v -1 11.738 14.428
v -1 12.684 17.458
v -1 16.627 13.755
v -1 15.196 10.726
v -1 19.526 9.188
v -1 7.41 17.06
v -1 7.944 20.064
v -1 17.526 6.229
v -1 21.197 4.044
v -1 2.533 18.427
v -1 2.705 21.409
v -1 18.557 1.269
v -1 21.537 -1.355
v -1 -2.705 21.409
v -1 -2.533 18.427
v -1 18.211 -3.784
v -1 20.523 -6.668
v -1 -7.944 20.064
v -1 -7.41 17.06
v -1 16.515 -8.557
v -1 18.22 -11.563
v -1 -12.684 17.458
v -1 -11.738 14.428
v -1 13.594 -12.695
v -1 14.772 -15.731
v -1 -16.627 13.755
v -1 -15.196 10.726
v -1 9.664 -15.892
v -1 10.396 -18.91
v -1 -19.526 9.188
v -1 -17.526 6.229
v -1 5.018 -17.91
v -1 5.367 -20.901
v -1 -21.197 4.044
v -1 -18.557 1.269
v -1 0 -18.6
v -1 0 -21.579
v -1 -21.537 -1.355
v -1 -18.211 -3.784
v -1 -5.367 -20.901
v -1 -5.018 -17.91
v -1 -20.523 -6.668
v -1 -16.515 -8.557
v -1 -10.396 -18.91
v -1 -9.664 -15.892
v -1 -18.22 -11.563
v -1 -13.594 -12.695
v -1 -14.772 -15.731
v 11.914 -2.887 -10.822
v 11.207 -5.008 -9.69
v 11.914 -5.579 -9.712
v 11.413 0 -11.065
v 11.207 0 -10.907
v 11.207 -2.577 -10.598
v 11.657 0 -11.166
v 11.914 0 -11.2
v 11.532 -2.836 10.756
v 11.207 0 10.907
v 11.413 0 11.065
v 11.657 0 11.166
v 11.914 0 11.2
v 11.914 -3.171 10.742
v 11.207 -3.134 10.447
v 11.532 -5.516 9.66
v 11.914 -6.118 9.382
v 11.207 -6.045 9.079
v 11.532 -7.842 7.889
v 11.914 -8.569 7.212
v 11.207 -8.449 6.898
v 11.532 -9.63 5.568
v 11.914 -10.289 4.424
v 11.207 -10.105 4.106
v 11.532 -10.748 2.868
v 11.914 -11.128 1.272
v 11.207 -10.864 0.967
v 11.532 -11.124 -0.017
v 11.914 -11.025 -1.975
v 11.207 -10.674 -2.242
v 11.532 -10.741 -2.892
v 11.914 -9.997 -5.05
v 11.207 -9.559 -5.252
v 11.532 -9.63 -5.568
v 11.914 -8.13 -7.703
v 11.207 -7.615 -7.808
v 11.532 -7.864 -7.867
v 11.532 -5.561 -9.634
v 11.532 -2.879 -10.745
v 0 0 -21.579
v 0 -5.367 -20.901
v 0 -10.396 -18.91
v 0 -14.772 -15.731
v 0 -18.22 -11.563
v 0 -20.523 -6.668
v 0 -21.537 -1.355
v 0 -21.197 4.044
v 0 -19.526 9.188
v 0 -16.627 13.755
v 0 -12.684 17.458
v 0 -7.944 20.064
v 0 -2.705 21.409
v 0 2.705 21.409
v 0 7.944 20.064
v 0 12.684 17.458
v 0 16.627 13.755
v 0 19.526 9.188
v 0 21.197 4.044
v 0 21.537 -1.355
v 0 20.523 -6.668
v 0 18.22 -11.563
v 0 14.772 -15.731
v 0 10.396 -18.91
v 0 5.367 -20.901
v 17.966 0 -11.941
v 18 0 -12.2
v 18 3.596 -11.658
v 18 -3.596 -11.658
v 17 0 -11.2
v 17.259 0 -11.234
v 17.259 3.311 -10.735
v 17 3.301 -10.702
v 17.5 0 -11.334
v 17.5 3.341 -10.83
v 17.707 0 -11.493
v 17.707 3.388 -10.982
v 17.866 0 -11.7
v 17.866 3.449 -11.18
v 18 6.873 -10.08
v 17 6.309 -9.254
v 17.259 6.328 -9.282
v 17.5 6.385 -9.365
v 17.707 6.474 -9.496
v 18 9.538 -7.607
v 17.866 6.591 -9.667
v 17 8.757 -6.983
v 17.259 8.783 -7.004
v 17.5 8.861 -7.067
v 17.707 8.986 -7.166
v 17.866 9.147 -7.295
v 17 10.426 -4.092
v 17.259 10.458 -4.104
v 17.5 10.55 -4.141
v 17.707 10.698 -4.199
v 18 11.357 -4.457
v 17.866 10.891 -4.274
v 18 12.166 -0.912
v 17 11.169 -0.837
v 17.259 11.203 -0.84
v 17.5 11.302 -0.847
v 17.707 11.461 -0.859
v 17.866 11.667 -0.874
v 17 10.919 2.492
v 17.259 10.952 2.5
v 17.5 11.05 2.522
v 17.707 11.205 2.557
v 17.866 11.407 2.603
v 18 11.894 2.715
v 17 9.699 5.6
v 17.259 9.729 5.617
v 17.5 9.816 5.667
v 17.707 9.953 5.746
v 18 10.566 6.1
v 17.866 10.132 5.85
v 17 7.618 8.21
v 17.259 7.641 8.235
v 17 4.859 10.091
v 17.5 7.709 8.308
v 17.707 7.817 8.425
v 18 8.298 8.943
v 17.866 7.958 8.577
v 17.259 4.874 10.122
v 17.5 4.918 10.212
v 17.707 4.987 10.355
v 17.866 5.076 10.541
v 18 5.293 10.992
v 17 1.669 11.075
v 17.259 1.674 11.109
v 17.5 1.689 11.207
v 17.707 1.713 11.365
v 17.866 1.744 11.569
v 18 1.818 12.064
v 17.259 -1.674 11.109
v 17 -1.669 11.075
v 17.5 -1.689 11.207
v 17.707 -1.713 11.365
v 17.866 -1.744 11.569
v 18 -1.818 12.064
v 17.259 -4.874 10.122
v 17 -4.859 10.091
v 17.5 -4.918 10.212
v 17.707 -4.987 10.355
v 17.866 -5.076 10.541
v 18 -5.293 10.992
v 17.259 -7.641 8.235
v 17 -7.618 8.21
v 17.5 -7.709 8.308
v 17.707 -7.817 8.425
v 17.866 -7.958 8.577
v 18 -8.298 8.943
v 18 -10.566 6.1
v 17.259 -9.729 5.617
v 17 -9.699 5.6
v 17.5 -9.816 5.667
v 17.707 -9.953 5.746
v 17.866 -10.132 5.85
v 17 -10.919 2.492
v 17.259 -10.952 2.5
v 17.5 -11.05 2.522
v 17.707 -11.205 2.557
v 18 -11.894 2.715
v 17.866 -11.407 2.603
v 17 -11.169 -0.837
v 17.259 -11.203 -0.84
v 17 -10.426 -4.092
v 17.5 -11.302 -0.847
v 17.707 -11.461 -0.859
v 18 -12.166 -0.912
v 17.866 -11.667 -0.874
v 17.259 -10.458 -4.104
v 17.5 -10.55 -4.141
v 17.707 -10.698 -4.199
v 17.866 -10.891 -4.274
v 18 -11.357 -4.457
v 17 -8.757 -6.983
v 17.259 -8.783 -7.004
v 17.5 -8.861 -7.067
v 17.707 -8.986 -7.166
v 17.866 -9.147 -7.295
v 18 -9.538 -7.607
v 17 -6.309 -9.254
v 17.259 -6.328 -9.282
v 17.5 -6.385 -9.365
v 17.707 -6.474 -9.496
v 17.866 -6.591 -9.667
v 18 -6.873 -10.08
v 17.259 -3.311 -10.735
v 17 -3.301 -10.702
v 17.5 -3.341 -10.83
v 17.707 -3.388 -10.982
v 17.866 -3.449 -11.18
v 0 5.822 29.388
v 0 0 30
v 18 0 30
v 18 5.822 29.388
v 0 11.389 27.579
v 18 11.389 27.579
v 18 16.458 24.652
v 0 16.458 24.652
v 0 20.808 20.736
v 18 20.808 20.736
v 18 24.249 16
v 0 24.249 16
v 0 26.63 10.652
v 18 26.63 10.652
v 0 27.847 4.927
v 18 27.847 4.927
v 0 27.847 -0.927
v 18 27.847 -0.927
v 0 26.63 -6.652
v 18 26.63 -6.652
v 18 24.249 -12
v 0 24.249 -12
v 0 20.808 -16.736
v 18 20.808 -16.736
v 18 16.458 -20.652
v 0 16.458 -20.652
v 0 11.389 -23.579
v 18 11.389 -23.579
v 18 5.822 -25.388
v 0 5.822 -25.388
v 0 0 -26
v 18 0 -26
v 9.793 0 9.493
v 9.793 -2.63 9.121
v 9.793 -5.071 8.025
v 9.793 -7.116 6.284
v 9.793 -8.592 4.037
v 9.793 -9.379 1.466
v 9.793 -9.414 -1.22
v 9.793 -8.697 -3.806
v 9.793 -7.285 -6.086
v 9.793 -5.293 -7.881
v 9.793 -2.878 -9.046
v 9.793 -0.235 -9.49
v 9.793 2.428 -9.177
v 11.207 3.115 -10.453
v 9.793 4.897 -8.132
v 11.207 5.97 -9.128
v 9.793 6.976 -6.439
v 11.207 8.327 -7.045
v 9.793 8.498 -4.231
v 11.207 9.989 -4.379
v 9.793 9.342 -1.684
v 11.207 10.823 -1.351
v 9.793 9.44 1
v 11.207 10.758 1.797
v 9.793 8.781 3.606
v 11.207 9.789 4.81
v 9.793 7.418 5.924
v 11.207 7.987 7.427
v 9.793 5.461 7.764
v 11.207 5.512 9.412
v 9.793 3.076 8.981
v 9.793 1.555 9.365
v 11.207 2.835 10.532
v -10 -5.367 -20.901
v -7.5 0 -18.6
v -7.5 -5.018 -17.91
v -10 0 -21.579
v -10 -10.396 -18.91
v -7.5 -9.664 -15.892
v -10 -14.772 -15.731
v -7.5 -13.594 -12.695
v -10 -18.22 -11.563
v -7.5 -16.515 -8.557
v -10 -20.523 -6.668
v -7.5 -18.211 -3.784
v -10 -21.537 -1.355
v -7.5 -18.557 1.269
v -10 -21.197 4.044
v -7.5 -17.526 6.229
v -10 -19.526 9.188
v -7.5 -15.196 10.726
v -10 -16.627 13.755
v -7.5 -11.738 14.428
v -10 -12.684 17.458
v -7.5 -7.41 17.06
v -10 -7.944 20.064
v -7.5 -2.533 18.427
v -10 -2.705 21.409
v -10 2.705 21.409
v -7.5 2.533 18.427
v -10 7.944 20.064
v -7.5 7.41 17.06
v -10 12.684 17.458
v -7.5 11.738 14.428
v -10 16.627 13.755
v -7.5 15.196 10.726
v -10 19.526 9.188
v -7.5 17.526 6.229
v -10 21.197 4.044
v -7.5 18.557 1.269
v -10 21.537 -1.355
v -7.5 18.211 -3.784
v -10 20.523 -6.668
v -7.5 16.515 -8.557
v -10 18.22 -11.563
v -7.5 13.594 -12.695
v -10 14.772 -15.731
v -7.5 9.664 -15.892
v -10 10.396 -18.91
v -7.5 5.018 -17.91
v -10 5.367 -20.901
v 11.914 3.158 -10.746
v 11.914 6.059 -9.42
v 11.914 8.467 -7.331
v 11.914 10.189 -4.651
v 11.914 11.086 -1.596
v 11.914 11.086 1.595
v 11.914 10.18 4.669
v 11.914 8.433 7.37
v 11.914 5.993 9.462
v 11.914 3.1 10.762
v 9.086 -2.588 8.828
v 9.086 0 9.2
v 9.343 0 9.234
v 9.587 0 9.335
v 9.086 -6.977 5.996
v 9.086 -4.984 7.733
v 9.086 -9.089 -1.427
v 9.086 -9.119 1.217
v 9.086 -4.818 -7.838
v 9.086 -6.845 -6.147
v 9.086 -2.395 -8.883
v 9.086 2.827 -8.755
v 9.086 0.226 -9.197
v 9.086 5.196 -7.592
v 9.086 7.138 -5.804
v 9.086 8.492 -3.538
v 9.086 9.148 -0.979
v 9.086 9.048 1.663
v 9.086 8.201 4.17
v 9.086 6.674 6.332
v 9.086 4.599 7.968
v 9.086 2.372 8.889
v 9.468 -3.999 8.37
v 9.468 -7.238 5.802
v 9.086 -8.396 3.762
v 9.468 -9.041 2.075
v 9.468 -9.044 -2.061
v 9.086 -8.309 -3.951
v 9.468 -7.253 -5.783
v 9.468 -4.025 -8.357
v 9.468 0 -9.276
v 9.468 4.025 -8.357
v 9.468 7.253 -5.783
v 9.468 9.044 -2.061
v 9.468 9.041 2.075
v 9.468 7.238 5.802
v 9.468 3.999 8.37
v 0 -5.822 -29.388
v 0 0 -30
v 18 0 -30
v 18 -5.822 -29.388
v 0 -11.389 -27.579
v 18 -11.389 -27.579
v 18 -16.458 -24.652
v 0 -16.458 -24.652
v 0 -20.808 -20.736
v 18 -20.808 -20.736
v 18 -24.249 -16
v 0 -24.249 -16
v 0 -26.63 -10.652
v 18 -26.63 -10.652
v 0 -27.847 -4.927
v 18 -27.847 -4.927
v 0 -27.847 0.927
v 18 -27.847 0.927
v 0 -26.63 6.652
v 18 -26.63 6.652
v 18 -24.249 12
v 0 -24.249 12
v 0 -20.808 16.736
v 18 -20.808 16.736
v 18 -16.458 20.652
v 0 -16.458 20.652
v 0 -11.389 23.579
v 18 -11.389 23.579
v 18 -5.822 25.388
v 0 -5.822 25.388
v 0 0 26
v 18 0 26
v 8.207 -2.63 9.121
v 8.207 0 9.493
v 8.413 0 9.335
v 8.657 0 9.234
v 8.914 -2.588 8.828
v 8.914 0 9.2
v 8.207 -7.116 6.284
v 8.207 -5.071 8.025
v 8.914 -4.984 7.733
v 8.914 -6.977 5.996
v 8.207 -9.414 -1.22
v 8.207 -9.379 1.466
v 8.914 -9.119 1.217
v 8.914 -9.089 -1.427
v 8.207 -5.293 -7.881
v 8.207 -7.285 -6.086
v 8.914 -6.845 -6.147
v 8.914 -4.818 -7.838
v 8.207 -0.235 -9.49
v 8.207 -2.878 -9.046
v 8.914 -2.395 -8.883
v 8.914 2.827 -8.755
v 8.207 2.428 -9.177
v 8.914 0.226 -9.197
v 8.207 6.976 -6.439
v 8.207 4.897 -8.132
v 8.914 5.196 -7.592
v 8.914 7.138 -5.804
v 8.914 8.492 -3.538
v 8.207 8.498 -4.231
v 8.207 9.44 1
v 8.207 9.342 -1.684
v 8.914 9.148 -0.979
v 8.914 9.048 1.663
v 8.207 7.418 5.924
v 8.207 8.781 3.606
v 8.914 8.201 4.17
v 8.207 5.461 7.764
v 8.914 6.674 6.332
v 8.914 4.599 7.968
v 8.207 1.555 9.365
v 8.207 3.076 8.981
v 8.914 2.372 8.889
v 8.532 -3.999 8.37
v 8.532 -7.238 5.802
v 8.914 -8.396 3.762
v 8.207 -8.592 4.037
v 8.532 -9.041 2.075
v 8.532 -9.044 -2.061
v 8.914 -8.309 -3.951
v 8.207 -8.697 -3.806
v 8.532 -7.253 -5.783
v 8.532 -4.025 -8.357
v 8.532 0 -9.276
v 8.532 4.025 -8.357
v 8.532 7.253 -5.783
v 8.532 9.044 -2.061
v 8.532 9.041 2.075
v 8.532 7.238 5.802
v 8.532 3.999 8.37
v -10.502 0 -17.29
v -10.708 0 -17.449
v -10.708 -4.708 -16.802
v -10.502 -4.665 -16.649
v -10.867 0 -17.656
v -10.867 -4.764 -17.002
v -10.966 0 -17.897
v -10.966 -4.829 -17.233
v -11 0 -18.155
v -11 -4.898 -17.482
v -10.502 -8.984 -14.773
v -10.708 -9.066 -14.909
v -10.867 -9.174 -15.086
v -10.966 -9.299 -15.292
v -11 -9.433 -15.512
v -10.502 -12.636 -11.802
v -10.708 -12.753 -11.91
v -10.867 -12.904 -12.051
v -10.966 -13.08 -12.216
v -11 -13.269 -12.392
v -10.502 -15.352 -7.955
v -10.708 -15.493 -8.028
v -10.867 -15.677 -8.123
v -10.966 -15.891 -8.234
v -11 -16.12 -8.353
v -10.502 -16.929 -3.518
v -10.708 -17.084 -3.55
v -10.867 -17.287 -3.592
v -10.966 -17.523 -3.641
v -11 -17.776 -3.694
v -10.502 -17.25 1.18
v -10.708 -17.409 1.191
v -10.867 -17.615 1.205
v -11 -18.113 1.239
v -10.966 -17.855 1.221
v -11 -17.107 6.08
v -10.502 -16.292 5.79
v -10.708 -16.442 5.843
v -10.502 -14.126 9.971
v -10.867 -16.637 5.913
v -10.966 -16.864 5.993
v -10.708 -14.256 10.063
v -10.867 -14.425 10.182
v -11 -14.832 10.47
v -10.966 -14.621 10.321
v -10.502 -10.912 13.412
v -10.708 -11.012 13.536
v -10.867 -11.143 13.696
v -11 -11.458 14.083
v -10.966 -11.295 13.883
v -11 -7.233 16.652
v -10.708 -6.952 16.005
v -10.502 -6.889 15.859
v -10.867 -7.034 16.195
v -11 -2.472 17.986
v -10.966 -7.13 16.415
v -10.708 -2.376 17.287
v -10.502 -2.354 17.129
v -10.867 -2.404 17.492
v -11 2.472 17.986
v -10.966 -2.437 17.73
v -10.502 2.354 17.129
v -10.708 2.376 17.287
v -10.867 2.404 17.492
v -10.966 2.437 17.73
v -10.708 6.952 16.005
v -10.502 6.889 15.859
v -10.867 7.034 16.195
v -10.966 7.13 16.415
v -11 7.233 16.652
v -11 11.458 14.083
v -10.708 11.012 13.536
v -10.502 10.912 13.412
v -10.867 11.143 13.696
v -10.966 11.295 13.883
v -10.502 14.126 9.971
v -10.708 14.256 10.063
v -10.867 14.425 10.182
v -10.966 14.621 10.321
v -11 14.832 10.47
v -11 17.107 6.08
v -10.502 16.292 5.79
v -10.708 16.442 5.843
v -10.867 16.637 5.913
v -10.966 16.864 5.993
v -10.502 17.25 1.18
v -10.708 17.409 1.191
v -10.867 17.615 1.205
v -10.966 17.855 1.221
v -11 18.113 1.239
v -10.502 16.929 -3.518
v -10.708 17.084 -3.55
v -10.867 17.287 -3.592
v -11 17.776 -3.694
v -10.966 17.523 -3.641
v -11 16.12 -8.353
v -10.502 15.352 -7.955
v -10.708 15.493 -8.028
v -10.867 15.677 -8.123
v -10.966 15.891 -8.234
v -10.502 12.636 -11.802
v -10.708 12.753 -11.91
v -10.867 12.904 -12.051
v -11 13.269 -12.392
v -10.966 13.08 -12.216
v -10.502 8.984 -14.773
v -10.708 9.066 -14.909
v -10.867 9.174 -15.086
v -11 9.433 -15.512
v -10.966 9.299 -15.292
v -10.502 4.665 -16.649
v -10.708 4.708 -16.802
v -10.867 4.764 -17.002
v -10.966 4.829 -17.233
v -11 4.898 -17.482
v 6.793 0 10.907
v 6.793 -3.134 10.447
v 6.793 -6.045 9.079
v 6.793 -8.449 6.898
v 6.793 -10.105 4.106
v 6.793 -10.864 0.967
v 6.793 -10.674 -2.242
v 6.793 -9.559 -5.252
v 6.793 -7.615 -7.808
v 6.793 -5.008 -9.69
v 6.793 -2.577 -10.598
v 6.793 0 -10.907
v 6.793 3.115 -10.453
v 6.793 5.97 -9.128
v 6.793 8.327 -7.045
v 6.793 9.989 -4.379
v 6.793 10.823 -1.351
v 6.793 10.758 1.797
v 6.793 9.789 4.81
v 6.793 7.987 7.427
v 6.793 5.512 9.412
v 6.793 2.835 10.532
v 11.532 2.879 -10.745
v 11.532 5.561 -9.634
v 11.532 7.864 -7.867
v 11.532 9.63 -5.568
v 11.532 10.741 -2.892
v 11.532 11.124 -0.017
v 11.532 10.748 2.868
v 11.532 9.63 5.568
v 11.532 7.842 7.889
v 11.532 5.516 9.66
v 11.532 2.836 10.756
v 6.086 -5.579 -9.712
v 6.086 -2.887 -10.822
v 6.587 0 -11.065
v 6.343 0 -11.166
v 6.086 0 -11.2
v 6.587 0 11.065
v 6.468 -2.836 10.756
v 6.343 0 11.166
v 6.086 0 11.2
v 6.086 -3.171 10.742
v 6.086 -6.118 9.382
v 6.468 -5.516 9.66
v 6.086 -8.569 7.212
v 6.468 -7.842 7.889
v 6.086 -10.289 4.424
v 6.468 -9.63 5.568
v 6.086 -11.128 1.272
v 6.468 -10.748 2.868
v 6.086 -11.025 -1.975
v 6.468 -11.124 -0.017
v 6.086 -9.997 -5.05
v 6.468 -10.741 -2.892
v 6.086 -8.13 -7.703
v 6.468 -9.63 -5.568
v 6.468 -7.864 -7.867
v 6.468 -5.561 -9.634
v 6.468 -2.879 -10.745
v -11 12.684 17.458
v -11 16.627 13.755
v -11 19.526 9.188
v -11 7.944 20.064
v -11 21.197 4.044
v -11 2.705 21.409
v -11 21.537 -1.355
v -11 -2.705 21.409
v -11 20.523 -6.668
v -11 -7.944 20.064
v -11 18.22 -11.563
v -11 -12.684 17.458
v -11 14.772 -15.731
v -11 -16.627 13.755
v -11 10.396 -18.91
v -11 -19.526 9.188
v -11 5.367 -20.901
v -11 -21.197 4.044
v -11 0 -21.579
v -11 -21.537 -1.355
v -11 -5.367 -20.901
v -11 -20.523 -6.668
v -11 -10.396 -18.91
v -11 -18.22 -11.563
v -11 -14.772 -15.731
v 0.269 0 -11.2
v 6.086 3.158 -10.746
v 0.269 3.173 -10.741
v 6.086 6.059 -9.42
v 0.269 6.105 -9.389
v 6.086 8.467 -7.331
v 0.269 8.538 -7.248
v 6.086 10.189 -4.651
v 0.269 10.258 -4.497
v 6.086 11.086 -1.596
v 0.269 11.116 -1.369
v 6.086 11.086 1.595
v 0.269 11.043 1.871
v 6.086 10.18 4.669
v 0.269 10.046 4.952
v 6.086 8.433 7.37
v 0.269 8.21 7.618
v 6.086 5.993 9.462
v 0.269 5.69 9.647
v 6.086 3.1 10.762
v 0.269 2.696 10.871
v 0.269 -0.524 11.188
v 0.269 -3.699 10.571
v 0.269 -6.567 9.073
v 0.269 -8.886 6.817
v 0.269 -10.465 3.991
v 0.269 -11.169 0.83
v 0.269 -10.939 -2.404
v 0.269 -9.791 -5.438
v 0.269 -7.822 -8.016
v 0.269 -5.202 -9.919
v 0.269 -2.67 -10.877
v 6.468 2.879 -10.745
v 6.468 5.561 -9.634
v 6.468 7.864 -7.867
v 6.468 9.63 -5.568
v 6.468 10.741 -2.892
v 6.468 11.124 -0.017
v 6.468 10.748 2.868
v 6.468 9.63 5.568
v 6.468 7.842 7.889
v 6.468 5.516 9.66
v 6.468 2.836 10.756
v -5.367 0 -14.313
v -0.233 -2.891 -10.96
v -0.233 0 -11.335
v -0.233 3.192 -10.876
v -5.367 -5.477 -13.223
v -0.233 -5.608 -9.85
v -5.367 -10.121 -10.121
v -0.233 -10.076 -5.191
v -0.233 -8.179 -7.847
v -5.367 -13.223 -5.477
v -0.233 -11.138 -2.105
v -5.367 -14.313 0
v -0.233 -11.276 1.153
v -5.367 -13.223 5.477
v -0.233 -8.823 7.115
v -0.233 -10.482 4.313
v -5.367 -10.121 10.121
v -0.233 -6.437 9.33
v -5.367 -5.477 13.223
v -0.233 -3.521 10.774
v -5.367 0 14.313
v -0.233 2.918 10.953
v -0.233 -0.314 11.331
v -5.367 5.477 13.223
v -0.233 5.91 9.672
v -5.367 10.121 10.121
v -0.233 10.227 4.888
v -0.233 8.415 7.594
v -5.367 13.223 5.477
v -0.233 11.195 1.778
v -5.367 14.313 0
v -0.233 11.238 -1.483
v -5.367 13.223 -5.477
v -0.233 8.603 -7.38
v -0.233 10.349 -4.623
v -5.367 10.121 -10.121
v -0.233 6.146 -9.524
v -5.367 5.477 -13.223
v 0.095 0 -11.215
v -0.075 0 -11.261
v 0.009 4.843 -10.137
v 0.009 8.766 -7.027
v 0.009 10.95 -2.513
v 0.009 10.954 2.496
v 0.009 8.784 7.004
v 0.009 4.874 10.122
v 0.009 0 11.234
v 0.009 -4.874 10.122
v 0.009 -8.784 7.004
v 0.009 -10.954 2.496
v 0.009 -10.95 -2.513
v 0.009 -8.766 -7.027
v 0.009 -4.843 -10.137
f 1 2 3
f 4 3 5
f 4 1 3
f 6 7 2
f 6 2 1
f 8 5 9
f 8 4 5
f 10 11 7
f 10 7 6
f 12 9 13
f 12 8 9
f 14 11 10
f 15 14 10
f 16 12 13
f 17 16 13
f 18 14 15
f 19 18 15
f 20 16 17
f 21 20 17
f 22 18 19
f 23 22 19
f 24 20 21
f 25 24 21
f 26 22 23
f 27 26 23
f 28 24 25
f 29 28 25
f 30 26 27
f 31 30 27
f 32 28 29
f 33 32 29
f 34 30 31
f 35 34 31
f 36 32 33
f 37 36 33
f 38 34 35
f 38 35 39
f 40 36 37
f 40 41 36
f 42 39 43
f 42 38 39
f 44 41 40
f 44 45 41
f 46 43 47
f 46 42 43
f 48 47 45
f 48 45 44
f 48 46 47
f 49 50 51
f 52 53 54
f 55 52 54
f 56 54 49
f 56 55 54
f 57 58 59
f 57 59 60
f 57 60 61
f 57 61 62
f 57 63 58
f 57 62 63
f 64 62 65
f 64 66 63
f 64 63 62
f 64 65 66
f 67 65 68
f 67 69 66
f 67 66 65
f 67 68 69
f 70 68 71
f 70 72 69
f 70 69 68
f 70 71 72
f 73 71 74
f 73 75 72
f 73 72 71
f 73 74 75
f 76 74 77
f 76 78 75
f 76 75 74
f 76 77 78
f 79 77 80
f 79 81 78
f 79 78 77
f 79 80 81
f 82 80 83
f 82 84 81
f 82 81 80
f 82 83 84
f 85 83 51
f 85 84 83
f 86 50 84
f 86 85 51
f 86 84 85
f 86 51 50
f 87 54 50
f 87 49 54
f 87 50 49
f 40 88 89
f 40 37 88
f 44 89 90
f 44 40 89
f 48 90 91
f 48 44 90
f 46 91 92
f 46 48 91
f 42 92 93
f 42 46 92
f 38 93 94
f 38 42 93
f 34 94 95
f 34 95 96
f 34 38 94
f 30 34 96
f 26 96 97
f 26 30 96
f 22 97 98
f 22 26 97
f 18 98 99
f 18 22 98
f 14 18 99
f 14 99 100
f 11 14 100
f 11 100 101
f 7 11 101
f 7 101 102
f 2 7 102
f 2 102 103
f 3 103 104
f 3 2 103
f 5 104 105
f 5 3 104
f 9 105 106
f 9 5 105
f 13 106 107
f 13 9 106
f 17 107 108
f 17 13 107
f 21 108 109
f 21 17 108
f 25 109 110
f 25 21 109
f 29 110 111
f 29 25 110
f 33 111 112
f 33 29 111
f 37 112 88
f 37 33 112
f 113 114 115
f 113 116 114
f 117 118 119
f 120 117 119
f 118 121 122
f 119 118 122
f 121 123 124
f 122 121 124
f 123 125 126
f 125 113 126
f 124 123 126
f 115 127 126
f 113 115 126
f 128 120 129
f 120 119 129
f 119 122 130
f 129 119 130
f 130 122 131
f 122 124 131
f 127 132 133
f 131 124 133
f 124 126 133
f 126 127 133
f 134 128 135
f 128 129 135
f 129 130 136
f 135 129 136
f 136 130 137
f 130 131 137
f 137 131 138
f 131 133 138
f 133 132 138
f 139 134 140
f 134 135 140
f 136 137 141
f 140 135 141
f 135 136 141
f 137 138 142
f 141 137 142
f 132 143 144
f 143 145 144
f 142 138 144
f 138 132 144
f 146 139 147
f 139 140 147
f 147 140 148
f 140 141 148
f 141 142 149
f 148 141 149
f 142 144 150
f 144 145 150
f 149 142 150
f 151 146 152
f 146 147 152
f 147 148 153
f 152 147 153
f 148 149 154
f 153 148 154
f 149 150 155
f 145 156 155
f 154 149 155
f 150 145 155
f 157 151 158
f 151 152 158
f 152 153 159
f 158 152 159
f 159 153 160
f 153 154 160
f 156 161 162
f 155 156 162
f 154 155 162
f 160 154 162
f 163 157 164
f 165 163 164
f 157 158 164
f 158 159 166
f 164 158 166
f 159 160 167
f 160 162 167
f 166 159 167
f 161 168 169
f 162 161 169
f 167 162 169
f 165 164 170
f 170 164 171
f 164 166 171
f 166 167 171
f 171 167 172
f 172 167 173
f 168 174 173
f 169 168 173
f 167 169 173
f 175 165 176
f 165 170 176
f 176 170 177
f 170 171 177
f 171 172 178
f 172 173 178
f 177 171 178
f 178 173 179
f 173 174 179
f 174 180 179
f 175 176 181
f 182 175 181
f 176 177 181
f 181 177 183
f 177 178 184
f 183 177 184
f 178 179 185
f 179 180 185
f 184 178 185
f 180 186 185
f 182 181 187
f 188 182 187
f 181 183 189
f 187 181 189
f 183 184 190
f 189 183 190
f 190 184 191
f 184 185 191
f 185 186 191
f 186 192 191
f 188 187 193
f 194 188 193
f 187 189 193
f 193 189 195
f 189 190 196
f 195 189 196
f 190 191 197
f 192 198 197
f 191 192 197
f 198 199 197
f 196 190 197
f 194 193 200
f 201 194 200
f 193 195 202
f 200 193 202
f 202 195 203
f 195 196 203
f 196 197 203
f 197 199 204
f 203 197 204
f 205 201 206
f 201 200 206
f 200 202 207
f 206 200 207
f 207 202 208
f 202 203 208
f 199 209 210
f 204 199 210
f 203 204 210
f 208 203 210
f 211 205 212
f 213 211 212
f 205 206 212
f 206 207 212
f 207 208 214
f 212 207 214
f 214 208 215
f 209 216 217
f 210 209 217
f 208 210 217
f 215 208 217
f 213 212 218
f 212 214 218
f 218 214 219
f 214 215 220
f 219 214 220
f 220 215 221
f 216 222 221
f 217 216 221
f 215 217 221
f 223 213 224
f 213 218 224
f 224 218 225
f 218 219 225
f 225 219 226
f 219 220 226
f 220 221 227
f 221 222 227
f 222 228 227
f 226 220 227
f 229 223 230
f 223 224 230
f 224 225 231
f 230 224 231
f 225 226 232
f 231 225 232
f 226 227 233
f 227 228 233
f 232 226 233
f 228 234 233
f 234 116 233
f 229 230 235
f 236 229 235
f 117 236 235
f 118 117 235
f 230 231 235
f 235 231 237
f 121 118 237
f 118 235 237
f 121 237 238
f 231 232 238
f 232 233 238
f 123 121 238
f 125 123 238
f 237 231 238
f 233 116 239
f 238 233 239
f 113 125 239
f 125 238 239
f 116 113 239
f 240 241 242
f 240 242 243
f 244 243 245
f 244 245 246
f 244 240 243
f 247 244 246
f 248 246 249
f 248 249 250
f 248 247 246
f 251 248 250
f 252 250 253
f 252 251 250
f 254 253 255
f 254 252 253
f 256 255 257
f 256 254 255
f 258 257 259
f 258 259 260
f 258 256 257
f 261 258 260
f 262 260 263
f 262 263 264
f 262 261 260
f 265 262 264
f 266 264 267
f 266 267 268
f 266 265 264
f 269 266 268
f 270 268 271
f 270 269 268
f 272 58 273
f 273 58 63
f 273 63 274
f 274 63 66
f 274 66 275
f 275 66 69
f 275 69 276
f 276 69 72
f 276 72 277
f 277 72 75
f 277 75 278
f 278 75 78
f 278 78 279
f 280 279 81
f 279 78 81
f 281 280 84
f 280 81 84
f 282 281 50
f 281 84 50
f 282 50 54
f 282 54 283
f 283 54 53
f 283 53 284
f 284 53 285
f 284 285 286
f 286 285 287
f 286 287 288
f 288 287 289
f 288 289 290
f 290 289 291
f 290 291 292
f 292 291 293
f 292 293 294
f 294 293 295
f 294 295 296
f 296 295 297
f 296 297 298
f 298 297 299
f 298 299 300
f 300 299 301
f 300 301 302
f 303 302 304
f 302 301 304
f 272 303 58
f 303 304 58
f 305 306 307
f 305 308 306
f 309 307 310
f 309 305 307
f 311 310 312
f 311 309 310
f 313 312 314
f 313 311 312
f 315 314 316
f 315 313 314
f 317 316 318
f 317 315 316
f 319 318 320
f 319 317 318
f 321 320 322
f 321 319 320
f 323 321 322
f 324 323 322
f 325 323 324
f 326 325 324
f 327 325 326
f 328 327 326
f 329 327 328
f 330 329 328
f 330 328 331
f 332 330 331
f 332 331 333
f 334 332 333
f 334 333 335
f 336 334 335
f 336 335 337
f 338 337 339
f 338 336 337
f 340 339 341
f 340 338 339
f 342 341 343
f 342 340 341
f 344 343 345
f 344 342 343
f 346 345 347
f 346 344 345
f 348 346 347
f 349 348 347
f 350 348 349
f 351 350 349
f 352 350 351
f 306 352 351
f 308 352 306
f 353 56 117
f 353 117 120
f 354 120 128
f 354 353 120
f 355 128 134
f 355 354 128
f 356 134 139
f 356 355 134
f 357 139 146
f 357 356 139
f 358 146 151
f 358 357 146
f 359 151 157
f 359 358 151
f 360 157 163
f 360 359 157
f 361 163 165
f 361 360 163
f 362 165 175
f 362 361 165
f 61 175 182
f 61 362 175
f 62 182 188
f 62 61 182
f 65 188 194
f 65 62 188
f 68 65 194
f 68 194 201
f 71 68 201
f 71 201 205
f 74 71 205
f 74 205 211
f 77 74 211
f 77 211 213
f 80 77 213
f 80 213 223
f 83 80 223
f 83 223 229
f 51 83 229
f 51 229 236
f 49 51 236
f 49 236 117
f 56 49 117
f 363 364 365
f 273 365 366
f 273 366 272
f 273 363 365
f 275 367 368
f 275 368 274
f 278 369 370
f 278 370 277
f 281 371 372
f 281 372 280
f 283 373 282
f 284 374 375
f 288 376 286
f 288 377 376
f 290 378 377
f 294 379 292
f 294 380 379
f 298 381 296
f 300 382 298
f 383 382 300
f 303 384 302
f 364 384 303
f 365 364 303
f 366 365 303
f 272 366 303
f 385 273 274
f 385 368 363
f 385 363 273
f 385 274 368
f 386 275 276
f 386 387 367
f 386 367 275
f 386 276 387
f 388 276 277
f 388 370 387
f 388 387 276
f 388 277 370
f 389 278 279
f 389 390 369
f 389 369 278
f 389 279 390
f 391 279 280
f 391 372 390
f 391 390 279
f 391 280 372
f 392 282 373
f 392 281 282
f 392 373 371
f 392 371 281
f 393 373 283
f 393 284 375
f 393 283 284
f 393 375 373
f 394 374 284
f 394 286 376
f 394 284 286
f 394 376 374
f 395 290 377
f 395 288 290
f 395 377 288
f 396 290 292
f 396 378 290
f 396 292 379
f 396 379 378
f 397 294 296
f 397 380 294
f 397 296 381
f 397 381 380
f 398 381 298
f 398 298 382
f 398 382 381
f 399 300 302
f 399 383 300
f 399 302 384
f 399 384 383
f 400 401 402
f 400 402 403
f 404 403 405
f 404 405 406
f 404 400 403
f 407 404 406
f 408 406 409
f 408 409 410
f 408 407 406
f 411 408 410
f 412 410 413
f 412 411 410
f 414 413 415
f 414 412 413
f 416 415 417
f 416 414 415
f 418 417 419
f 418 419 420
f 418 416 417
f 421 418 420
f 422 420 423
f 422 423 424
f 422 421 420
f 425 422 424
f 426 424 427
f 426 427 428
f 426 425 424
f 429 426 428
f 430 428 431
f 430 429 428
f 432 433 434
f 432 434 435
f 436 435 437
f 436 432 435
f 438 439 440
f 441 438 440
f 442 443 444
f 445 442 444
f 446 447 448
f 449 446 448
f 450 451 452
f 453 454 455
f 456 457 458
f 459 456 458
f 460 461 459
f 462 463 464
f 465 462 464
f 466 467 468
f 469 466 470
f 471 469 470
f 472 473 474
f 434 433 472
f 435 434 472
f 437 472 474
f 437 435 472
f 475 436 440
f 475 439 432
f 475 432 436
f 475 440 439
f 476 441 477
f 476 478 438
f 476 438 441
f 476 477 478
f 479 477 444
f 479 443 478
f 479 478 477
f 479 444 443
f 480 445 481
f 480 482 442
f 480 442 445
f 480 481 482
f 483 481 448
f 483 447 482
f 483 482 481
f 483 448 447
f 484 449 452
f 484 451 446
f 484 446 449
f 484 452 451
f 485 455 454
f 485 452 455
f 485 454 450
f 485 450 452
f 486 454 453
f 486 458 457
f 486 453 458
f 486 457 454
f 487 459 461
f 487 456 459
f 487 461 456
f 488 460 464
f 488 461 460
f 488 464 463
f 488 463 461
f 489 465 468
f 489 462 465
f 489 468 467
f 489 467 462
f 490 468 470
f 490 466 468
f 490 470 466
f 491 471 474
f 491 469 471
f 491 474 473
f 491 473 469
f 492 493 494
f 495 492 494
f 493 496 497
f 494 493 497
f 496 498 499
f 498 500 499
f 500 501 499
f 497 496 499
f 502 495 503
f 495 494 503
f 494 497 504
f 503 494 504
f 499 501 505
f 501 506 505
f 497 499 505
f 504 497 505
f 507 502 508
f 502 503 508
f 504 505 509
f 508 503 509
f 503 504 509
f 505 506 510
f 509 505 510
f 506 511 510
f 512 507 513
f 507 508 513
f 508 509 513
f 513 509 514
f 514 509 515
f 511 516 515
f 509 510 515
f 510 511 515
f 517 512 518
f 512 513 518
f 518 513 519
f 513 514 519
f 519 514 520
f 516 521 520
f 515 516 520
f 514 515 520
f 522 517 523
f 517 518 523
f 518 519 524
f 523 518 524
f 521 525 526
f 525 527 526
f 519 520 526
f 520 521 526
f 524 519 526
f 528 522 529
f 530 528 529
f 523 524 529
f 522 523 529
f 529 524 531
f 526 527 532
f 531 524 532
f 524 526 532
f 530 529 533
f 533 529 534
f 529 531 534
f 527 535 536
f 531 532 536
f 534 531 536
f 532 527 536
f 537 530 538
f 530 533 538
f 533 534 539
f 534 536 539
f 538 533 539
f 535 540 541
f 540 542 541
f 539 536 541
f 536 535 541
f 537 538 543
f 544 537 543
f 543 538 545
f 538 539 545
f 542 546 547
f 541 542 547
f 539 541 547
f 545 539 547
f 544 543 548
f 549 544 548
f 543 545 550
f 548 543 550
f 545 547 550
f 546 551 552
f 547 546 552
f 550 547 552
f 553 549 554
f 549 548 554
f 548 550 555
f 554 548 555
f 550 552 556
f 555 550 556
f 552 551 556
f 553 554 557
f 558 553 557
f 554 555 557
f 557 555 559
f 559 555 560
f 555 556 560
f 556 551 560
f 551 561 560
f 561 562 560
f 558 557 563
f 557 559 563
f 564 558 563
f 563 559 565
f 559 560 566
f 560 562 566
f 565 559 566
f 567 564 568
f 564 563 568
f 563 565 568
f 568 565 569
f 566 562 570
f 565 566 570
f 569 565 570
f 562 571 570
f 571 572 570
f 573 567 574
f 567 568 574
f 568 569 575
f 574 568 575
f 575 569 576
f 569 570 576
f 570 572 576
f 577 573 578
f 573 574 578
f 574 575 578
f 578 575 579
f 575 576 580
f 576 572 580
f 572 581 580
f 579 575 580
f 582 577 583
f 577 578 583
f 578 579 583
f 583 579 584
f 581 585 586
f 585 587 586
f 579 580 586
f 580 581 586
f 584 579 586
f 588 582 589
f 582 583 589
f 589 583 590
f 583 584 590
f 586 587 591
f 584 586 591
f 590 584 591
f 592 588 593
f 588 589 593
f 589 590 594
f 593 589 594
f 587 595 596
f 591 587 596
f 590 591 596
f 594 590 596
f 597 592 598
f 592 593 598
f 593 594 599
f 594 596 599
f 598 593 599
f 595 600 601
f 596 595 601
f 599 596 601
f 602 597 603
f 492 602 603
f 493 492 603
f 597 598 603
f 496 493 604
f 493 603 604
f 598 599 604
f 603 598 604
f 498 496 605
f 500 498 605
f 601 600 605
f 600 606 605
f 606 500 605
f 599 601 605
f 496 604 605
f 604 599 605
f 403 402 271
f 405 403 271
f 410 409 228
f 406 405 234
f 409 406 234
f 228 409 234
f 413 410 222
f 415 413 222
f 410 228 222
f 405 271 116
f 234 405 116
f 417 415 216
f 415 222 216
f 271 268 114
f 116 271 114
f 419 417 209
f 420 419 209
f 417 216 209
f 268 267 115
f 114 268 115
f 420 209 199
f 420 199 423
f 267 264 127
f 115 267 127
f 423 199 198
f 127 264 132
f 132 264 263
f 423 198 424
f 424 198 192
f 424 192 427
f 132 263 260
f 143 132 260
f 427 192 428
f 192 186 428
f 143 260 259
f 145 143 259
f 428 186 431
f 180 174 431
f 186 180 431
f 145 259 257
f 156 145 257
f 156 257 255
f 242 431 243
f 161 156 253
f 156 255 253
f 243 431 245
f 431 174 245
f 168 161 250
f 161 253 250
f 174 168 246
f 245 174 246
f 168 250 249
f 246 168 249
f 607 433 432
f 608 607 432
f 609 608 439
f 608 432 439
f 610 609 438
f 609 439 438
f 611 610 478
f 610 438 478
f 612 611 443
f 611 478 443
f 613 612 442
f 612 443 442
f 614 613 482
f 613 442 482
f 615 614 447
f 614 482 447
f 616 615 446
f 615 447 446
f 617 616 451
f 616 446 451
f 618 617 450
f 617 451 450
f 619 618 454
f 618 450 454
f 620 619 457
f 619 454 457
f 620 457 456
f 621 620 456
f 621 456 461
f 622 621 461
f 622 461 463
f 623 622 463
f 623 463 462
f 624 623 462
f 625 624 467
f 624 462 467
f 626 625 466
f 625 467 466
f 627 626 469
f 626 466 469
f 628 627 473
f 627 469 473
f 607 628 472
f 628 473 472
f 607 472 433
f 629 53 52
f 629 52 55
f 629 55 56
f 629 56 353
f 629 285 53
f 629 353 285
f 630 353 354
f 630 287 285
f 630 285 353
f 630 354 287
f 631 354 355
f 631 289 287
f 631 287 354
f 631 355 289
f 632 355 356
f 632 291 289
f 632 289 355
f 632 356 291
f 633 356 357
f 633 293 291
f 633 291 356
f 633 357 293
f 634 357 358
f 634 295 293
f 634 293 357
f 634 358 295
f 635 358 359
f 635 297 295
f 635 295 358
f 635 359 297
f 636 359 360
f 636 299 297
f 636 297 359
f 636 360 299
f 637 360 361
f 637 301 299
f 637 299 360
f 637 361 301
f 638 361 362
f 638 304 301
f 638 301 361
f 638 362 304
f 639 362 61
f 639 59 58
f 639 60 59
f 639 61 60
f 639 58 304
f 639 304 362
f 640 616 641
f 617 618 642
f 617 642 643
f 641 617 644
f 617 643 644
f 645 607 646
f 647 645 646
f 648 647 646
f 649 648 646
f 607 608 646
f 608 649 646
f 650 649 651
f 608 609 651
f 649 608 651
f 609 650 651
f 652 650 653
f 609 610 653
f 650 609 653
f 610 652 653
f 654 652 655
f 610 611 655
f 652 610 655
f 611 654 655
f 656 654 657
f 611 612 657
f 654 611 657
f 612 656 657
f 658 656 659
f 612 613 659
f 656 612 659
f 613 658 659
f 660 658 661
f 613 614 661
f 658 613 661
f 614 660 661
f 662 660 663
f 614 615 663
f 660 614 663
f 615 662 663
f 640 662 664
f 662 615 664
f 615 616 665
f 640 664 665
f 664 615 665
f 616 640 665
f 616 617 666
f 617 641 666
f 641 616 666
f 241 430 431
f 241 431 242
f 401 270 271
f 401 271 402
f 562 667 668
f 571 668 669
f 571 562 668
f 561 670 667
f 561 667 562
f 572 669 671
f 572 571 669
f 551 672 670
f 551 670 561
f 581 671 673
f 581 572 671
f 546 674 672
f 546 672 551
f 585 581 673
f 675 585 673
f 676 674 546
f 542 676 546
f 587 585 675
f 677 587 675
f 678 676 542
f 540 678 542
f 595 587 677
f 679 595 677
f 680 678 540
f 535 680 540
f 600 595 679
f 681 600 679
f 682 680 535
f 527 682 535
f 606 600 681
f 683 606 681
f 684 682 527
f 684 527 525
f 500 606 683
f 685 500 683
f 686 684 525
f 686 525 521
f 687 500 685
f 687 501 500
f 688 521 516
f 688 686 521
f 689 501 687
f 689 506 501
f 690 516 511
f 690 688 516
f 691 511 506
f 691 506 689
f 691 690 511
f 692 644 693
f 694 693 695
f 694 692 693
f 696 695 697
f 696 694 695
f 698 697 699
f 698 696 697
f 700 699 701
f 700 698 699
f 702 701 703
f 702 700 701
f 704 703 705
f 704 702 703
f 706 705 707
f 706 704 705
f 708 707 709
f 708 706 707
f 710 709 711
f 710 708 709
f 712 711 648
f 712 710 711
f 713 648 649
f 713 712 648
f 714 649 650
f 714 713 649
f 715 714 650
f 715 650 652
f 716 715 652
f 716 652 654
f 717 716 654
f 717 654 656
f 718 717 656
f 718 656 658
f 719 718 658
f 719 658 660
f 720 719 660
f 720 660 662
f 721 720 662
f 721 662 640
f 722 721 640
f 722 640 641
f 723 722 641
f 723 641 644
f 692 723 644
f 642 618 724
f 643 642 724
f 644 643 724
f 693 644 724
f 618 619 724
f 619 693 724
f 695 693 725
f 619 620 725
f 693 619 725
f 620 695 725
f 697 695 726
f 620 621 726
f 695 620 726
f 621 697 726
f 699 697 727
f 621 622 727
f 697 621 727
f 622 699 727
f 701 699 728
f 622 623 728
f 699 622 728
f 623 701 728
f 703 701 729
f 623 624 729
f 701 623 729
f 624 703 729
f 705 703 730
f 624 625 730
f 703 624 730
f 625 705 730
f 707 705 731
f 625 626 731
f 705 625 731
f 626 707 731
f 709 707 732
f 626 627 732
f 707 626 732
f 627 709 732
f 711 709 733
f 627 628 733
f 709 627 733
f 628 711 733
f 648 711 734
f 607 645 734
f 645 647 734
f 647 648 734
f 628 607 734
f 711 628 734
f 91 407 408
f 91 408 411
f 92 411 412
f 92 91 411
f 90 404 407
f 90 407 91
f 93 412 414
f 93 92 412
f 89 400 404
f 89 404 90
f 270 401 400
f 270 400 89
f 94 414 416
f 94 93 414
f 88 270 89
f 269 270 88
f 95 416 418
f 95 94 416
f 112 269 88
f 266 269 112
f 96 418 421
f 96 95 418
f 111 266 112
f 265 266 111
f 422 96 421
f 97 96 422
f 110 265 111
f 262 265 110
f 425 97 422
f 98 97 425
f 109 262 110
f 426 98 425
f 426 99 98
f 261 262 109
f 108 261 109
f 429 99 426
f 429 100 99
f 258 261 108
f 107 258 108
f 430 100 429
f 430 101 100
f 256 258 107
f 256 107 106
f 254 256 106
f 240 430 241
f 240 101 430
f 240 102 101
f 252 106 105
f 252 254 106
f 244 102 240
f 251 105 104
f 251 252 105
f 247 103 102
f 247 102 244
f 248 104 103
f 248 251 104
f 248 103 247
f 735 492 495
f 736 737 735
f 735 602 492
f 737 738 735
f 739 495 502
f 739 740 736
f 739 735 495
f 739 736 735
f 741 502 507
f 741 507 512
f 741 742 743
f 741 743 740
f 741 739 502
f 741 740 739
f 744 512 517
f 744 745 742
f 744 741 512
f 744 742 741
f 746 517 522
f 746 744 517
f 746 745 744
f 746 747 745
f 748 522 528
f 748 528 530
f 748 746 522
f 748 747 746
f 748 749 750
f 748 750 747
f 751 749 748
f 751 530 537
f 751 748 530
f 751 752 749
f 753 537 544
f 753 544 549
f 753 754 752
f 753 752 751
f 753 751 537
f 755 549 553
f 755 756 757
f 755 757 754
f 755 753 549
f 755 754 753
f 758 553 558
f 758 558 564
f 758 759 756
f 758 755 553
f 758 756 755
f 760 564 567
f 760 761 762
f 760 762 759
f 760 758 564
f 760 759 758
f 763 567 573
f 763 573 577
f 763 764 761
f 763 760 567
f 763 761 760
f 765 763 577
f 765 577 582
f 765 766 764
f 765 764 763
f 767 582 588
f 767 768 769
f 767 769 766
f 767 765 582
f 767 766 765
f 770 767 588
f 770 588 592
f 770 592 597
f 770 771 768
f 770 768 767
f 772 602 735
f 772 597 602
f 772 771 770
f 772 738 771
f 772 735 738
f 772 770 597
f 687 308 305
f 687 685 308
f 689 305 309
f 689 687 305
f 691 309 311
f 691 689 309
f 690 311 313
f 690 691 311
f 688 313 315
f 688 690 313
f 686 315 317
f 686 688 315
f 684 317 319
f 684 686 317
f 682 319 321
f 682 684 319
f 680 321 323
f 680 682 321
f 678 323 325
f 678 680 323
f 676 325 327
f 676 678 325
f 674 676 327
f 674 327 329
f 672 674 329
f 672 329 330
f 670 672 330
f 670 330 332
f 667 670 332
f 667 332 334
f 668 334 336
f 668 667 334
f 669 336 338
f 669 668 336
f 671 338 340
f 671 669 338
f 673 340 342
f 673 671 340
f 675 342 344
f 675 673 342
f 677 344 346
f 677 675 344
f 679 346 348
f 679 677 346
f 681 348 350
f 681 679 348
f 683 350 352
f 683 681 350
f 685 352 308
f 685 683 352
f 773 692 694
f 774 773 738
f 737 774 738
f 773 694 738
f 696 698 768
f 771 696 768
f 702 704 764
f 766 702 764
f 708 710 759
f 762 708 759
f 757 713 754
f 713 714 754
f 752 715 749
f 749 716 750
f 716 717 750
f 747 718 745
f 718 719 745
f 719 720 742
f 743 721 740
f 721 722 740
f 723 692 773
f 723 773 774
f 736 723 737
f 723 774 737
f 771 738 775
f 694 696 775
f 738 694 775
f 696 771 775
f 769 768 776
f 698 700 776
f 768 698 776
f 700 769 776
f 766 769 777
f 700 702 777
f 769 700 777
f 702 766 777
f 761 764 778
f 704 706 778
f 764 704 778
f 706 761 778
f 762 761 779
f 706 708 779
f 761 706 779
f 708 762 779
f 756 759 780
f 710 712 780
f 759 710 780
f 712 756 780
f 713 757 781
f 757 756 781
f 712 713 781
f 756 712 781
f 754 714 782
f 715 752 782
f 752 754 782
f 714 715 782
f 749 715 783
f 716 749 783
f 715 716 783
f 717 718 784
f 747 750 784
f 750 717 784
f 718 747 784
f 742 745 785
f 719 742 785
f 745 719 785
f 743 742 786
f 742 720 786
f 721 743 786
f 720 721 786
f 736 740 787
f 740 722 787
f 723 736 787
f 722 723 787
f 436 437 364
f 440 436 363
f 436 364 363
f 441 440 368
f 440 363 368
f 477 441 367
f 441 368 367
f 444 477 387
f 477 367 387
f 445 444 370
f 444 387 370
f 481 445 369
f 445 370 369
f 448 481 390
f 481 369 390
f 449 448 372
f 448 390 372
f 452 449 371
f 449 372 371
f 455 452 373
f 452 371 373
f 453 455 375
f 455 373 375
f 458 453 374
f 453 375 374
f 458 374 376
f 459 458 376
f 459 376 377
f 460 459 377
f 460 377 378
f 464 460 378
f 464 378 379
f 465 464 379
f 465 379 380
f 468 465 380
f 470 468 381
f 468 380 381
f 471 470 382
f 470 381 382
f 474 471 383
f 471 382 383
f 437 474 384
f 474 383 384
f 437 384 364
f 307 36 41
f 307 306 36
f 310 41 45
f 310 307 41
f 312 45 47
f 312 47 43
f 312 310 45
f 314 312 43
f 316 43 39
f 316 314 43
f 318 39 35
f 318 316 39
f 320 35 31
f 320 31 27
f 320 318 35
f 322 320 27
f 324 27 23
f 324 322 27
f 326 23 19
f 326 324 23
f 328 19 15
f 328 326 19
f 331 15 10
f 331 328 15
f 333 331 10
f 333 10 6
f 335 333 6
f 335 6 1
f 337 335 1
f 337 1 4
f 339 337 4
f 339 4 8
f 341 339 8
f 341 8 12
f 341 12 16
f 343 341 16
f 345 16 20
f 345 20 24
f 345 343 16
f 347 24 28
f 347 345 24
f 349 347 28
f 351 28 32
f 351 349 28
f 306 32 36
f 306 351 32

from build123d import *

# Parameters (mm, degrees)
SKETCH1_R           = 11.2
BOSS_EXTRUDE1_DEPTH = 18
FILLET1_R           = 1


with BuildPart() as part:
    # Sketch1 → Boss-Extrude1 (new body)
    with BuildSketch(Plane(origin=(0, 0, 0), x_dir=(0, 0, -1), z_dir=(1, 0, 0))):
        with BuildLine():
            Line((26, 0), (30, 0))
            ThreePointArc((30, 0), (2, -28), (-26, 0))
            Line((-26, 0), (-30, 0))
            ThreePointArc((-30, 0), (-2, 28), (26, 0))
        make_face()
        Circle(SKETCH1_R, mode=Mode.SUBTRACT)
    extrude(amount=BOSS_EXTRUDE1_DEPTH)

    # Sketch2 → Revolve1 (revolve)
    with BuildSketch(Plane(origin=(0, 0, 0), x_dir=(1, 0, 0), z_dir=(0, 1, 0))):
        Polygon((0, 21.579383981), (-1, 21.579383981), (-1, 18.6), (-7.5, 18.6), (-10, 21.579383981), (-11, 21.579383981), (-11, 17.579383981), (0, 11.2), align=None)
    revolve(axis=Axis((0, 0, 0), (-1, 0, 0)))

    # Sketch4 → Revolve2 (revolve)
    with BuildSketch(Plane.XY, mode=Mode.PRIVATE) as revolve2_sk:
        Polygon((6.5, 11.2), (8.5, 9.2), (9.5, 9.2), (11.5, 11.2), align=None)
    revolve(revolve2_sk.sketch.rotate(Axis((0, 0, 0), (1, 0, 0)), 90), axis=Axis((0, 0, 0), (1, 0, 0)))

    # Fillet1
    fillet1_edges = [part.edges().sort_by_distance(p)[0] for p in [
        (0, 0, 11.2),
        (18, 0, 11.2),
        (-11, 0, 17.579383981),
        (11.5, 11.2, 0),
        (6.5, 11.2, 0),
        (8.5, 0, -9.2),
        (9.5, 0, -9.2),
    ]]
    fillet(fillet1_edges, radius=FILLET1_R)


solid = part.part
